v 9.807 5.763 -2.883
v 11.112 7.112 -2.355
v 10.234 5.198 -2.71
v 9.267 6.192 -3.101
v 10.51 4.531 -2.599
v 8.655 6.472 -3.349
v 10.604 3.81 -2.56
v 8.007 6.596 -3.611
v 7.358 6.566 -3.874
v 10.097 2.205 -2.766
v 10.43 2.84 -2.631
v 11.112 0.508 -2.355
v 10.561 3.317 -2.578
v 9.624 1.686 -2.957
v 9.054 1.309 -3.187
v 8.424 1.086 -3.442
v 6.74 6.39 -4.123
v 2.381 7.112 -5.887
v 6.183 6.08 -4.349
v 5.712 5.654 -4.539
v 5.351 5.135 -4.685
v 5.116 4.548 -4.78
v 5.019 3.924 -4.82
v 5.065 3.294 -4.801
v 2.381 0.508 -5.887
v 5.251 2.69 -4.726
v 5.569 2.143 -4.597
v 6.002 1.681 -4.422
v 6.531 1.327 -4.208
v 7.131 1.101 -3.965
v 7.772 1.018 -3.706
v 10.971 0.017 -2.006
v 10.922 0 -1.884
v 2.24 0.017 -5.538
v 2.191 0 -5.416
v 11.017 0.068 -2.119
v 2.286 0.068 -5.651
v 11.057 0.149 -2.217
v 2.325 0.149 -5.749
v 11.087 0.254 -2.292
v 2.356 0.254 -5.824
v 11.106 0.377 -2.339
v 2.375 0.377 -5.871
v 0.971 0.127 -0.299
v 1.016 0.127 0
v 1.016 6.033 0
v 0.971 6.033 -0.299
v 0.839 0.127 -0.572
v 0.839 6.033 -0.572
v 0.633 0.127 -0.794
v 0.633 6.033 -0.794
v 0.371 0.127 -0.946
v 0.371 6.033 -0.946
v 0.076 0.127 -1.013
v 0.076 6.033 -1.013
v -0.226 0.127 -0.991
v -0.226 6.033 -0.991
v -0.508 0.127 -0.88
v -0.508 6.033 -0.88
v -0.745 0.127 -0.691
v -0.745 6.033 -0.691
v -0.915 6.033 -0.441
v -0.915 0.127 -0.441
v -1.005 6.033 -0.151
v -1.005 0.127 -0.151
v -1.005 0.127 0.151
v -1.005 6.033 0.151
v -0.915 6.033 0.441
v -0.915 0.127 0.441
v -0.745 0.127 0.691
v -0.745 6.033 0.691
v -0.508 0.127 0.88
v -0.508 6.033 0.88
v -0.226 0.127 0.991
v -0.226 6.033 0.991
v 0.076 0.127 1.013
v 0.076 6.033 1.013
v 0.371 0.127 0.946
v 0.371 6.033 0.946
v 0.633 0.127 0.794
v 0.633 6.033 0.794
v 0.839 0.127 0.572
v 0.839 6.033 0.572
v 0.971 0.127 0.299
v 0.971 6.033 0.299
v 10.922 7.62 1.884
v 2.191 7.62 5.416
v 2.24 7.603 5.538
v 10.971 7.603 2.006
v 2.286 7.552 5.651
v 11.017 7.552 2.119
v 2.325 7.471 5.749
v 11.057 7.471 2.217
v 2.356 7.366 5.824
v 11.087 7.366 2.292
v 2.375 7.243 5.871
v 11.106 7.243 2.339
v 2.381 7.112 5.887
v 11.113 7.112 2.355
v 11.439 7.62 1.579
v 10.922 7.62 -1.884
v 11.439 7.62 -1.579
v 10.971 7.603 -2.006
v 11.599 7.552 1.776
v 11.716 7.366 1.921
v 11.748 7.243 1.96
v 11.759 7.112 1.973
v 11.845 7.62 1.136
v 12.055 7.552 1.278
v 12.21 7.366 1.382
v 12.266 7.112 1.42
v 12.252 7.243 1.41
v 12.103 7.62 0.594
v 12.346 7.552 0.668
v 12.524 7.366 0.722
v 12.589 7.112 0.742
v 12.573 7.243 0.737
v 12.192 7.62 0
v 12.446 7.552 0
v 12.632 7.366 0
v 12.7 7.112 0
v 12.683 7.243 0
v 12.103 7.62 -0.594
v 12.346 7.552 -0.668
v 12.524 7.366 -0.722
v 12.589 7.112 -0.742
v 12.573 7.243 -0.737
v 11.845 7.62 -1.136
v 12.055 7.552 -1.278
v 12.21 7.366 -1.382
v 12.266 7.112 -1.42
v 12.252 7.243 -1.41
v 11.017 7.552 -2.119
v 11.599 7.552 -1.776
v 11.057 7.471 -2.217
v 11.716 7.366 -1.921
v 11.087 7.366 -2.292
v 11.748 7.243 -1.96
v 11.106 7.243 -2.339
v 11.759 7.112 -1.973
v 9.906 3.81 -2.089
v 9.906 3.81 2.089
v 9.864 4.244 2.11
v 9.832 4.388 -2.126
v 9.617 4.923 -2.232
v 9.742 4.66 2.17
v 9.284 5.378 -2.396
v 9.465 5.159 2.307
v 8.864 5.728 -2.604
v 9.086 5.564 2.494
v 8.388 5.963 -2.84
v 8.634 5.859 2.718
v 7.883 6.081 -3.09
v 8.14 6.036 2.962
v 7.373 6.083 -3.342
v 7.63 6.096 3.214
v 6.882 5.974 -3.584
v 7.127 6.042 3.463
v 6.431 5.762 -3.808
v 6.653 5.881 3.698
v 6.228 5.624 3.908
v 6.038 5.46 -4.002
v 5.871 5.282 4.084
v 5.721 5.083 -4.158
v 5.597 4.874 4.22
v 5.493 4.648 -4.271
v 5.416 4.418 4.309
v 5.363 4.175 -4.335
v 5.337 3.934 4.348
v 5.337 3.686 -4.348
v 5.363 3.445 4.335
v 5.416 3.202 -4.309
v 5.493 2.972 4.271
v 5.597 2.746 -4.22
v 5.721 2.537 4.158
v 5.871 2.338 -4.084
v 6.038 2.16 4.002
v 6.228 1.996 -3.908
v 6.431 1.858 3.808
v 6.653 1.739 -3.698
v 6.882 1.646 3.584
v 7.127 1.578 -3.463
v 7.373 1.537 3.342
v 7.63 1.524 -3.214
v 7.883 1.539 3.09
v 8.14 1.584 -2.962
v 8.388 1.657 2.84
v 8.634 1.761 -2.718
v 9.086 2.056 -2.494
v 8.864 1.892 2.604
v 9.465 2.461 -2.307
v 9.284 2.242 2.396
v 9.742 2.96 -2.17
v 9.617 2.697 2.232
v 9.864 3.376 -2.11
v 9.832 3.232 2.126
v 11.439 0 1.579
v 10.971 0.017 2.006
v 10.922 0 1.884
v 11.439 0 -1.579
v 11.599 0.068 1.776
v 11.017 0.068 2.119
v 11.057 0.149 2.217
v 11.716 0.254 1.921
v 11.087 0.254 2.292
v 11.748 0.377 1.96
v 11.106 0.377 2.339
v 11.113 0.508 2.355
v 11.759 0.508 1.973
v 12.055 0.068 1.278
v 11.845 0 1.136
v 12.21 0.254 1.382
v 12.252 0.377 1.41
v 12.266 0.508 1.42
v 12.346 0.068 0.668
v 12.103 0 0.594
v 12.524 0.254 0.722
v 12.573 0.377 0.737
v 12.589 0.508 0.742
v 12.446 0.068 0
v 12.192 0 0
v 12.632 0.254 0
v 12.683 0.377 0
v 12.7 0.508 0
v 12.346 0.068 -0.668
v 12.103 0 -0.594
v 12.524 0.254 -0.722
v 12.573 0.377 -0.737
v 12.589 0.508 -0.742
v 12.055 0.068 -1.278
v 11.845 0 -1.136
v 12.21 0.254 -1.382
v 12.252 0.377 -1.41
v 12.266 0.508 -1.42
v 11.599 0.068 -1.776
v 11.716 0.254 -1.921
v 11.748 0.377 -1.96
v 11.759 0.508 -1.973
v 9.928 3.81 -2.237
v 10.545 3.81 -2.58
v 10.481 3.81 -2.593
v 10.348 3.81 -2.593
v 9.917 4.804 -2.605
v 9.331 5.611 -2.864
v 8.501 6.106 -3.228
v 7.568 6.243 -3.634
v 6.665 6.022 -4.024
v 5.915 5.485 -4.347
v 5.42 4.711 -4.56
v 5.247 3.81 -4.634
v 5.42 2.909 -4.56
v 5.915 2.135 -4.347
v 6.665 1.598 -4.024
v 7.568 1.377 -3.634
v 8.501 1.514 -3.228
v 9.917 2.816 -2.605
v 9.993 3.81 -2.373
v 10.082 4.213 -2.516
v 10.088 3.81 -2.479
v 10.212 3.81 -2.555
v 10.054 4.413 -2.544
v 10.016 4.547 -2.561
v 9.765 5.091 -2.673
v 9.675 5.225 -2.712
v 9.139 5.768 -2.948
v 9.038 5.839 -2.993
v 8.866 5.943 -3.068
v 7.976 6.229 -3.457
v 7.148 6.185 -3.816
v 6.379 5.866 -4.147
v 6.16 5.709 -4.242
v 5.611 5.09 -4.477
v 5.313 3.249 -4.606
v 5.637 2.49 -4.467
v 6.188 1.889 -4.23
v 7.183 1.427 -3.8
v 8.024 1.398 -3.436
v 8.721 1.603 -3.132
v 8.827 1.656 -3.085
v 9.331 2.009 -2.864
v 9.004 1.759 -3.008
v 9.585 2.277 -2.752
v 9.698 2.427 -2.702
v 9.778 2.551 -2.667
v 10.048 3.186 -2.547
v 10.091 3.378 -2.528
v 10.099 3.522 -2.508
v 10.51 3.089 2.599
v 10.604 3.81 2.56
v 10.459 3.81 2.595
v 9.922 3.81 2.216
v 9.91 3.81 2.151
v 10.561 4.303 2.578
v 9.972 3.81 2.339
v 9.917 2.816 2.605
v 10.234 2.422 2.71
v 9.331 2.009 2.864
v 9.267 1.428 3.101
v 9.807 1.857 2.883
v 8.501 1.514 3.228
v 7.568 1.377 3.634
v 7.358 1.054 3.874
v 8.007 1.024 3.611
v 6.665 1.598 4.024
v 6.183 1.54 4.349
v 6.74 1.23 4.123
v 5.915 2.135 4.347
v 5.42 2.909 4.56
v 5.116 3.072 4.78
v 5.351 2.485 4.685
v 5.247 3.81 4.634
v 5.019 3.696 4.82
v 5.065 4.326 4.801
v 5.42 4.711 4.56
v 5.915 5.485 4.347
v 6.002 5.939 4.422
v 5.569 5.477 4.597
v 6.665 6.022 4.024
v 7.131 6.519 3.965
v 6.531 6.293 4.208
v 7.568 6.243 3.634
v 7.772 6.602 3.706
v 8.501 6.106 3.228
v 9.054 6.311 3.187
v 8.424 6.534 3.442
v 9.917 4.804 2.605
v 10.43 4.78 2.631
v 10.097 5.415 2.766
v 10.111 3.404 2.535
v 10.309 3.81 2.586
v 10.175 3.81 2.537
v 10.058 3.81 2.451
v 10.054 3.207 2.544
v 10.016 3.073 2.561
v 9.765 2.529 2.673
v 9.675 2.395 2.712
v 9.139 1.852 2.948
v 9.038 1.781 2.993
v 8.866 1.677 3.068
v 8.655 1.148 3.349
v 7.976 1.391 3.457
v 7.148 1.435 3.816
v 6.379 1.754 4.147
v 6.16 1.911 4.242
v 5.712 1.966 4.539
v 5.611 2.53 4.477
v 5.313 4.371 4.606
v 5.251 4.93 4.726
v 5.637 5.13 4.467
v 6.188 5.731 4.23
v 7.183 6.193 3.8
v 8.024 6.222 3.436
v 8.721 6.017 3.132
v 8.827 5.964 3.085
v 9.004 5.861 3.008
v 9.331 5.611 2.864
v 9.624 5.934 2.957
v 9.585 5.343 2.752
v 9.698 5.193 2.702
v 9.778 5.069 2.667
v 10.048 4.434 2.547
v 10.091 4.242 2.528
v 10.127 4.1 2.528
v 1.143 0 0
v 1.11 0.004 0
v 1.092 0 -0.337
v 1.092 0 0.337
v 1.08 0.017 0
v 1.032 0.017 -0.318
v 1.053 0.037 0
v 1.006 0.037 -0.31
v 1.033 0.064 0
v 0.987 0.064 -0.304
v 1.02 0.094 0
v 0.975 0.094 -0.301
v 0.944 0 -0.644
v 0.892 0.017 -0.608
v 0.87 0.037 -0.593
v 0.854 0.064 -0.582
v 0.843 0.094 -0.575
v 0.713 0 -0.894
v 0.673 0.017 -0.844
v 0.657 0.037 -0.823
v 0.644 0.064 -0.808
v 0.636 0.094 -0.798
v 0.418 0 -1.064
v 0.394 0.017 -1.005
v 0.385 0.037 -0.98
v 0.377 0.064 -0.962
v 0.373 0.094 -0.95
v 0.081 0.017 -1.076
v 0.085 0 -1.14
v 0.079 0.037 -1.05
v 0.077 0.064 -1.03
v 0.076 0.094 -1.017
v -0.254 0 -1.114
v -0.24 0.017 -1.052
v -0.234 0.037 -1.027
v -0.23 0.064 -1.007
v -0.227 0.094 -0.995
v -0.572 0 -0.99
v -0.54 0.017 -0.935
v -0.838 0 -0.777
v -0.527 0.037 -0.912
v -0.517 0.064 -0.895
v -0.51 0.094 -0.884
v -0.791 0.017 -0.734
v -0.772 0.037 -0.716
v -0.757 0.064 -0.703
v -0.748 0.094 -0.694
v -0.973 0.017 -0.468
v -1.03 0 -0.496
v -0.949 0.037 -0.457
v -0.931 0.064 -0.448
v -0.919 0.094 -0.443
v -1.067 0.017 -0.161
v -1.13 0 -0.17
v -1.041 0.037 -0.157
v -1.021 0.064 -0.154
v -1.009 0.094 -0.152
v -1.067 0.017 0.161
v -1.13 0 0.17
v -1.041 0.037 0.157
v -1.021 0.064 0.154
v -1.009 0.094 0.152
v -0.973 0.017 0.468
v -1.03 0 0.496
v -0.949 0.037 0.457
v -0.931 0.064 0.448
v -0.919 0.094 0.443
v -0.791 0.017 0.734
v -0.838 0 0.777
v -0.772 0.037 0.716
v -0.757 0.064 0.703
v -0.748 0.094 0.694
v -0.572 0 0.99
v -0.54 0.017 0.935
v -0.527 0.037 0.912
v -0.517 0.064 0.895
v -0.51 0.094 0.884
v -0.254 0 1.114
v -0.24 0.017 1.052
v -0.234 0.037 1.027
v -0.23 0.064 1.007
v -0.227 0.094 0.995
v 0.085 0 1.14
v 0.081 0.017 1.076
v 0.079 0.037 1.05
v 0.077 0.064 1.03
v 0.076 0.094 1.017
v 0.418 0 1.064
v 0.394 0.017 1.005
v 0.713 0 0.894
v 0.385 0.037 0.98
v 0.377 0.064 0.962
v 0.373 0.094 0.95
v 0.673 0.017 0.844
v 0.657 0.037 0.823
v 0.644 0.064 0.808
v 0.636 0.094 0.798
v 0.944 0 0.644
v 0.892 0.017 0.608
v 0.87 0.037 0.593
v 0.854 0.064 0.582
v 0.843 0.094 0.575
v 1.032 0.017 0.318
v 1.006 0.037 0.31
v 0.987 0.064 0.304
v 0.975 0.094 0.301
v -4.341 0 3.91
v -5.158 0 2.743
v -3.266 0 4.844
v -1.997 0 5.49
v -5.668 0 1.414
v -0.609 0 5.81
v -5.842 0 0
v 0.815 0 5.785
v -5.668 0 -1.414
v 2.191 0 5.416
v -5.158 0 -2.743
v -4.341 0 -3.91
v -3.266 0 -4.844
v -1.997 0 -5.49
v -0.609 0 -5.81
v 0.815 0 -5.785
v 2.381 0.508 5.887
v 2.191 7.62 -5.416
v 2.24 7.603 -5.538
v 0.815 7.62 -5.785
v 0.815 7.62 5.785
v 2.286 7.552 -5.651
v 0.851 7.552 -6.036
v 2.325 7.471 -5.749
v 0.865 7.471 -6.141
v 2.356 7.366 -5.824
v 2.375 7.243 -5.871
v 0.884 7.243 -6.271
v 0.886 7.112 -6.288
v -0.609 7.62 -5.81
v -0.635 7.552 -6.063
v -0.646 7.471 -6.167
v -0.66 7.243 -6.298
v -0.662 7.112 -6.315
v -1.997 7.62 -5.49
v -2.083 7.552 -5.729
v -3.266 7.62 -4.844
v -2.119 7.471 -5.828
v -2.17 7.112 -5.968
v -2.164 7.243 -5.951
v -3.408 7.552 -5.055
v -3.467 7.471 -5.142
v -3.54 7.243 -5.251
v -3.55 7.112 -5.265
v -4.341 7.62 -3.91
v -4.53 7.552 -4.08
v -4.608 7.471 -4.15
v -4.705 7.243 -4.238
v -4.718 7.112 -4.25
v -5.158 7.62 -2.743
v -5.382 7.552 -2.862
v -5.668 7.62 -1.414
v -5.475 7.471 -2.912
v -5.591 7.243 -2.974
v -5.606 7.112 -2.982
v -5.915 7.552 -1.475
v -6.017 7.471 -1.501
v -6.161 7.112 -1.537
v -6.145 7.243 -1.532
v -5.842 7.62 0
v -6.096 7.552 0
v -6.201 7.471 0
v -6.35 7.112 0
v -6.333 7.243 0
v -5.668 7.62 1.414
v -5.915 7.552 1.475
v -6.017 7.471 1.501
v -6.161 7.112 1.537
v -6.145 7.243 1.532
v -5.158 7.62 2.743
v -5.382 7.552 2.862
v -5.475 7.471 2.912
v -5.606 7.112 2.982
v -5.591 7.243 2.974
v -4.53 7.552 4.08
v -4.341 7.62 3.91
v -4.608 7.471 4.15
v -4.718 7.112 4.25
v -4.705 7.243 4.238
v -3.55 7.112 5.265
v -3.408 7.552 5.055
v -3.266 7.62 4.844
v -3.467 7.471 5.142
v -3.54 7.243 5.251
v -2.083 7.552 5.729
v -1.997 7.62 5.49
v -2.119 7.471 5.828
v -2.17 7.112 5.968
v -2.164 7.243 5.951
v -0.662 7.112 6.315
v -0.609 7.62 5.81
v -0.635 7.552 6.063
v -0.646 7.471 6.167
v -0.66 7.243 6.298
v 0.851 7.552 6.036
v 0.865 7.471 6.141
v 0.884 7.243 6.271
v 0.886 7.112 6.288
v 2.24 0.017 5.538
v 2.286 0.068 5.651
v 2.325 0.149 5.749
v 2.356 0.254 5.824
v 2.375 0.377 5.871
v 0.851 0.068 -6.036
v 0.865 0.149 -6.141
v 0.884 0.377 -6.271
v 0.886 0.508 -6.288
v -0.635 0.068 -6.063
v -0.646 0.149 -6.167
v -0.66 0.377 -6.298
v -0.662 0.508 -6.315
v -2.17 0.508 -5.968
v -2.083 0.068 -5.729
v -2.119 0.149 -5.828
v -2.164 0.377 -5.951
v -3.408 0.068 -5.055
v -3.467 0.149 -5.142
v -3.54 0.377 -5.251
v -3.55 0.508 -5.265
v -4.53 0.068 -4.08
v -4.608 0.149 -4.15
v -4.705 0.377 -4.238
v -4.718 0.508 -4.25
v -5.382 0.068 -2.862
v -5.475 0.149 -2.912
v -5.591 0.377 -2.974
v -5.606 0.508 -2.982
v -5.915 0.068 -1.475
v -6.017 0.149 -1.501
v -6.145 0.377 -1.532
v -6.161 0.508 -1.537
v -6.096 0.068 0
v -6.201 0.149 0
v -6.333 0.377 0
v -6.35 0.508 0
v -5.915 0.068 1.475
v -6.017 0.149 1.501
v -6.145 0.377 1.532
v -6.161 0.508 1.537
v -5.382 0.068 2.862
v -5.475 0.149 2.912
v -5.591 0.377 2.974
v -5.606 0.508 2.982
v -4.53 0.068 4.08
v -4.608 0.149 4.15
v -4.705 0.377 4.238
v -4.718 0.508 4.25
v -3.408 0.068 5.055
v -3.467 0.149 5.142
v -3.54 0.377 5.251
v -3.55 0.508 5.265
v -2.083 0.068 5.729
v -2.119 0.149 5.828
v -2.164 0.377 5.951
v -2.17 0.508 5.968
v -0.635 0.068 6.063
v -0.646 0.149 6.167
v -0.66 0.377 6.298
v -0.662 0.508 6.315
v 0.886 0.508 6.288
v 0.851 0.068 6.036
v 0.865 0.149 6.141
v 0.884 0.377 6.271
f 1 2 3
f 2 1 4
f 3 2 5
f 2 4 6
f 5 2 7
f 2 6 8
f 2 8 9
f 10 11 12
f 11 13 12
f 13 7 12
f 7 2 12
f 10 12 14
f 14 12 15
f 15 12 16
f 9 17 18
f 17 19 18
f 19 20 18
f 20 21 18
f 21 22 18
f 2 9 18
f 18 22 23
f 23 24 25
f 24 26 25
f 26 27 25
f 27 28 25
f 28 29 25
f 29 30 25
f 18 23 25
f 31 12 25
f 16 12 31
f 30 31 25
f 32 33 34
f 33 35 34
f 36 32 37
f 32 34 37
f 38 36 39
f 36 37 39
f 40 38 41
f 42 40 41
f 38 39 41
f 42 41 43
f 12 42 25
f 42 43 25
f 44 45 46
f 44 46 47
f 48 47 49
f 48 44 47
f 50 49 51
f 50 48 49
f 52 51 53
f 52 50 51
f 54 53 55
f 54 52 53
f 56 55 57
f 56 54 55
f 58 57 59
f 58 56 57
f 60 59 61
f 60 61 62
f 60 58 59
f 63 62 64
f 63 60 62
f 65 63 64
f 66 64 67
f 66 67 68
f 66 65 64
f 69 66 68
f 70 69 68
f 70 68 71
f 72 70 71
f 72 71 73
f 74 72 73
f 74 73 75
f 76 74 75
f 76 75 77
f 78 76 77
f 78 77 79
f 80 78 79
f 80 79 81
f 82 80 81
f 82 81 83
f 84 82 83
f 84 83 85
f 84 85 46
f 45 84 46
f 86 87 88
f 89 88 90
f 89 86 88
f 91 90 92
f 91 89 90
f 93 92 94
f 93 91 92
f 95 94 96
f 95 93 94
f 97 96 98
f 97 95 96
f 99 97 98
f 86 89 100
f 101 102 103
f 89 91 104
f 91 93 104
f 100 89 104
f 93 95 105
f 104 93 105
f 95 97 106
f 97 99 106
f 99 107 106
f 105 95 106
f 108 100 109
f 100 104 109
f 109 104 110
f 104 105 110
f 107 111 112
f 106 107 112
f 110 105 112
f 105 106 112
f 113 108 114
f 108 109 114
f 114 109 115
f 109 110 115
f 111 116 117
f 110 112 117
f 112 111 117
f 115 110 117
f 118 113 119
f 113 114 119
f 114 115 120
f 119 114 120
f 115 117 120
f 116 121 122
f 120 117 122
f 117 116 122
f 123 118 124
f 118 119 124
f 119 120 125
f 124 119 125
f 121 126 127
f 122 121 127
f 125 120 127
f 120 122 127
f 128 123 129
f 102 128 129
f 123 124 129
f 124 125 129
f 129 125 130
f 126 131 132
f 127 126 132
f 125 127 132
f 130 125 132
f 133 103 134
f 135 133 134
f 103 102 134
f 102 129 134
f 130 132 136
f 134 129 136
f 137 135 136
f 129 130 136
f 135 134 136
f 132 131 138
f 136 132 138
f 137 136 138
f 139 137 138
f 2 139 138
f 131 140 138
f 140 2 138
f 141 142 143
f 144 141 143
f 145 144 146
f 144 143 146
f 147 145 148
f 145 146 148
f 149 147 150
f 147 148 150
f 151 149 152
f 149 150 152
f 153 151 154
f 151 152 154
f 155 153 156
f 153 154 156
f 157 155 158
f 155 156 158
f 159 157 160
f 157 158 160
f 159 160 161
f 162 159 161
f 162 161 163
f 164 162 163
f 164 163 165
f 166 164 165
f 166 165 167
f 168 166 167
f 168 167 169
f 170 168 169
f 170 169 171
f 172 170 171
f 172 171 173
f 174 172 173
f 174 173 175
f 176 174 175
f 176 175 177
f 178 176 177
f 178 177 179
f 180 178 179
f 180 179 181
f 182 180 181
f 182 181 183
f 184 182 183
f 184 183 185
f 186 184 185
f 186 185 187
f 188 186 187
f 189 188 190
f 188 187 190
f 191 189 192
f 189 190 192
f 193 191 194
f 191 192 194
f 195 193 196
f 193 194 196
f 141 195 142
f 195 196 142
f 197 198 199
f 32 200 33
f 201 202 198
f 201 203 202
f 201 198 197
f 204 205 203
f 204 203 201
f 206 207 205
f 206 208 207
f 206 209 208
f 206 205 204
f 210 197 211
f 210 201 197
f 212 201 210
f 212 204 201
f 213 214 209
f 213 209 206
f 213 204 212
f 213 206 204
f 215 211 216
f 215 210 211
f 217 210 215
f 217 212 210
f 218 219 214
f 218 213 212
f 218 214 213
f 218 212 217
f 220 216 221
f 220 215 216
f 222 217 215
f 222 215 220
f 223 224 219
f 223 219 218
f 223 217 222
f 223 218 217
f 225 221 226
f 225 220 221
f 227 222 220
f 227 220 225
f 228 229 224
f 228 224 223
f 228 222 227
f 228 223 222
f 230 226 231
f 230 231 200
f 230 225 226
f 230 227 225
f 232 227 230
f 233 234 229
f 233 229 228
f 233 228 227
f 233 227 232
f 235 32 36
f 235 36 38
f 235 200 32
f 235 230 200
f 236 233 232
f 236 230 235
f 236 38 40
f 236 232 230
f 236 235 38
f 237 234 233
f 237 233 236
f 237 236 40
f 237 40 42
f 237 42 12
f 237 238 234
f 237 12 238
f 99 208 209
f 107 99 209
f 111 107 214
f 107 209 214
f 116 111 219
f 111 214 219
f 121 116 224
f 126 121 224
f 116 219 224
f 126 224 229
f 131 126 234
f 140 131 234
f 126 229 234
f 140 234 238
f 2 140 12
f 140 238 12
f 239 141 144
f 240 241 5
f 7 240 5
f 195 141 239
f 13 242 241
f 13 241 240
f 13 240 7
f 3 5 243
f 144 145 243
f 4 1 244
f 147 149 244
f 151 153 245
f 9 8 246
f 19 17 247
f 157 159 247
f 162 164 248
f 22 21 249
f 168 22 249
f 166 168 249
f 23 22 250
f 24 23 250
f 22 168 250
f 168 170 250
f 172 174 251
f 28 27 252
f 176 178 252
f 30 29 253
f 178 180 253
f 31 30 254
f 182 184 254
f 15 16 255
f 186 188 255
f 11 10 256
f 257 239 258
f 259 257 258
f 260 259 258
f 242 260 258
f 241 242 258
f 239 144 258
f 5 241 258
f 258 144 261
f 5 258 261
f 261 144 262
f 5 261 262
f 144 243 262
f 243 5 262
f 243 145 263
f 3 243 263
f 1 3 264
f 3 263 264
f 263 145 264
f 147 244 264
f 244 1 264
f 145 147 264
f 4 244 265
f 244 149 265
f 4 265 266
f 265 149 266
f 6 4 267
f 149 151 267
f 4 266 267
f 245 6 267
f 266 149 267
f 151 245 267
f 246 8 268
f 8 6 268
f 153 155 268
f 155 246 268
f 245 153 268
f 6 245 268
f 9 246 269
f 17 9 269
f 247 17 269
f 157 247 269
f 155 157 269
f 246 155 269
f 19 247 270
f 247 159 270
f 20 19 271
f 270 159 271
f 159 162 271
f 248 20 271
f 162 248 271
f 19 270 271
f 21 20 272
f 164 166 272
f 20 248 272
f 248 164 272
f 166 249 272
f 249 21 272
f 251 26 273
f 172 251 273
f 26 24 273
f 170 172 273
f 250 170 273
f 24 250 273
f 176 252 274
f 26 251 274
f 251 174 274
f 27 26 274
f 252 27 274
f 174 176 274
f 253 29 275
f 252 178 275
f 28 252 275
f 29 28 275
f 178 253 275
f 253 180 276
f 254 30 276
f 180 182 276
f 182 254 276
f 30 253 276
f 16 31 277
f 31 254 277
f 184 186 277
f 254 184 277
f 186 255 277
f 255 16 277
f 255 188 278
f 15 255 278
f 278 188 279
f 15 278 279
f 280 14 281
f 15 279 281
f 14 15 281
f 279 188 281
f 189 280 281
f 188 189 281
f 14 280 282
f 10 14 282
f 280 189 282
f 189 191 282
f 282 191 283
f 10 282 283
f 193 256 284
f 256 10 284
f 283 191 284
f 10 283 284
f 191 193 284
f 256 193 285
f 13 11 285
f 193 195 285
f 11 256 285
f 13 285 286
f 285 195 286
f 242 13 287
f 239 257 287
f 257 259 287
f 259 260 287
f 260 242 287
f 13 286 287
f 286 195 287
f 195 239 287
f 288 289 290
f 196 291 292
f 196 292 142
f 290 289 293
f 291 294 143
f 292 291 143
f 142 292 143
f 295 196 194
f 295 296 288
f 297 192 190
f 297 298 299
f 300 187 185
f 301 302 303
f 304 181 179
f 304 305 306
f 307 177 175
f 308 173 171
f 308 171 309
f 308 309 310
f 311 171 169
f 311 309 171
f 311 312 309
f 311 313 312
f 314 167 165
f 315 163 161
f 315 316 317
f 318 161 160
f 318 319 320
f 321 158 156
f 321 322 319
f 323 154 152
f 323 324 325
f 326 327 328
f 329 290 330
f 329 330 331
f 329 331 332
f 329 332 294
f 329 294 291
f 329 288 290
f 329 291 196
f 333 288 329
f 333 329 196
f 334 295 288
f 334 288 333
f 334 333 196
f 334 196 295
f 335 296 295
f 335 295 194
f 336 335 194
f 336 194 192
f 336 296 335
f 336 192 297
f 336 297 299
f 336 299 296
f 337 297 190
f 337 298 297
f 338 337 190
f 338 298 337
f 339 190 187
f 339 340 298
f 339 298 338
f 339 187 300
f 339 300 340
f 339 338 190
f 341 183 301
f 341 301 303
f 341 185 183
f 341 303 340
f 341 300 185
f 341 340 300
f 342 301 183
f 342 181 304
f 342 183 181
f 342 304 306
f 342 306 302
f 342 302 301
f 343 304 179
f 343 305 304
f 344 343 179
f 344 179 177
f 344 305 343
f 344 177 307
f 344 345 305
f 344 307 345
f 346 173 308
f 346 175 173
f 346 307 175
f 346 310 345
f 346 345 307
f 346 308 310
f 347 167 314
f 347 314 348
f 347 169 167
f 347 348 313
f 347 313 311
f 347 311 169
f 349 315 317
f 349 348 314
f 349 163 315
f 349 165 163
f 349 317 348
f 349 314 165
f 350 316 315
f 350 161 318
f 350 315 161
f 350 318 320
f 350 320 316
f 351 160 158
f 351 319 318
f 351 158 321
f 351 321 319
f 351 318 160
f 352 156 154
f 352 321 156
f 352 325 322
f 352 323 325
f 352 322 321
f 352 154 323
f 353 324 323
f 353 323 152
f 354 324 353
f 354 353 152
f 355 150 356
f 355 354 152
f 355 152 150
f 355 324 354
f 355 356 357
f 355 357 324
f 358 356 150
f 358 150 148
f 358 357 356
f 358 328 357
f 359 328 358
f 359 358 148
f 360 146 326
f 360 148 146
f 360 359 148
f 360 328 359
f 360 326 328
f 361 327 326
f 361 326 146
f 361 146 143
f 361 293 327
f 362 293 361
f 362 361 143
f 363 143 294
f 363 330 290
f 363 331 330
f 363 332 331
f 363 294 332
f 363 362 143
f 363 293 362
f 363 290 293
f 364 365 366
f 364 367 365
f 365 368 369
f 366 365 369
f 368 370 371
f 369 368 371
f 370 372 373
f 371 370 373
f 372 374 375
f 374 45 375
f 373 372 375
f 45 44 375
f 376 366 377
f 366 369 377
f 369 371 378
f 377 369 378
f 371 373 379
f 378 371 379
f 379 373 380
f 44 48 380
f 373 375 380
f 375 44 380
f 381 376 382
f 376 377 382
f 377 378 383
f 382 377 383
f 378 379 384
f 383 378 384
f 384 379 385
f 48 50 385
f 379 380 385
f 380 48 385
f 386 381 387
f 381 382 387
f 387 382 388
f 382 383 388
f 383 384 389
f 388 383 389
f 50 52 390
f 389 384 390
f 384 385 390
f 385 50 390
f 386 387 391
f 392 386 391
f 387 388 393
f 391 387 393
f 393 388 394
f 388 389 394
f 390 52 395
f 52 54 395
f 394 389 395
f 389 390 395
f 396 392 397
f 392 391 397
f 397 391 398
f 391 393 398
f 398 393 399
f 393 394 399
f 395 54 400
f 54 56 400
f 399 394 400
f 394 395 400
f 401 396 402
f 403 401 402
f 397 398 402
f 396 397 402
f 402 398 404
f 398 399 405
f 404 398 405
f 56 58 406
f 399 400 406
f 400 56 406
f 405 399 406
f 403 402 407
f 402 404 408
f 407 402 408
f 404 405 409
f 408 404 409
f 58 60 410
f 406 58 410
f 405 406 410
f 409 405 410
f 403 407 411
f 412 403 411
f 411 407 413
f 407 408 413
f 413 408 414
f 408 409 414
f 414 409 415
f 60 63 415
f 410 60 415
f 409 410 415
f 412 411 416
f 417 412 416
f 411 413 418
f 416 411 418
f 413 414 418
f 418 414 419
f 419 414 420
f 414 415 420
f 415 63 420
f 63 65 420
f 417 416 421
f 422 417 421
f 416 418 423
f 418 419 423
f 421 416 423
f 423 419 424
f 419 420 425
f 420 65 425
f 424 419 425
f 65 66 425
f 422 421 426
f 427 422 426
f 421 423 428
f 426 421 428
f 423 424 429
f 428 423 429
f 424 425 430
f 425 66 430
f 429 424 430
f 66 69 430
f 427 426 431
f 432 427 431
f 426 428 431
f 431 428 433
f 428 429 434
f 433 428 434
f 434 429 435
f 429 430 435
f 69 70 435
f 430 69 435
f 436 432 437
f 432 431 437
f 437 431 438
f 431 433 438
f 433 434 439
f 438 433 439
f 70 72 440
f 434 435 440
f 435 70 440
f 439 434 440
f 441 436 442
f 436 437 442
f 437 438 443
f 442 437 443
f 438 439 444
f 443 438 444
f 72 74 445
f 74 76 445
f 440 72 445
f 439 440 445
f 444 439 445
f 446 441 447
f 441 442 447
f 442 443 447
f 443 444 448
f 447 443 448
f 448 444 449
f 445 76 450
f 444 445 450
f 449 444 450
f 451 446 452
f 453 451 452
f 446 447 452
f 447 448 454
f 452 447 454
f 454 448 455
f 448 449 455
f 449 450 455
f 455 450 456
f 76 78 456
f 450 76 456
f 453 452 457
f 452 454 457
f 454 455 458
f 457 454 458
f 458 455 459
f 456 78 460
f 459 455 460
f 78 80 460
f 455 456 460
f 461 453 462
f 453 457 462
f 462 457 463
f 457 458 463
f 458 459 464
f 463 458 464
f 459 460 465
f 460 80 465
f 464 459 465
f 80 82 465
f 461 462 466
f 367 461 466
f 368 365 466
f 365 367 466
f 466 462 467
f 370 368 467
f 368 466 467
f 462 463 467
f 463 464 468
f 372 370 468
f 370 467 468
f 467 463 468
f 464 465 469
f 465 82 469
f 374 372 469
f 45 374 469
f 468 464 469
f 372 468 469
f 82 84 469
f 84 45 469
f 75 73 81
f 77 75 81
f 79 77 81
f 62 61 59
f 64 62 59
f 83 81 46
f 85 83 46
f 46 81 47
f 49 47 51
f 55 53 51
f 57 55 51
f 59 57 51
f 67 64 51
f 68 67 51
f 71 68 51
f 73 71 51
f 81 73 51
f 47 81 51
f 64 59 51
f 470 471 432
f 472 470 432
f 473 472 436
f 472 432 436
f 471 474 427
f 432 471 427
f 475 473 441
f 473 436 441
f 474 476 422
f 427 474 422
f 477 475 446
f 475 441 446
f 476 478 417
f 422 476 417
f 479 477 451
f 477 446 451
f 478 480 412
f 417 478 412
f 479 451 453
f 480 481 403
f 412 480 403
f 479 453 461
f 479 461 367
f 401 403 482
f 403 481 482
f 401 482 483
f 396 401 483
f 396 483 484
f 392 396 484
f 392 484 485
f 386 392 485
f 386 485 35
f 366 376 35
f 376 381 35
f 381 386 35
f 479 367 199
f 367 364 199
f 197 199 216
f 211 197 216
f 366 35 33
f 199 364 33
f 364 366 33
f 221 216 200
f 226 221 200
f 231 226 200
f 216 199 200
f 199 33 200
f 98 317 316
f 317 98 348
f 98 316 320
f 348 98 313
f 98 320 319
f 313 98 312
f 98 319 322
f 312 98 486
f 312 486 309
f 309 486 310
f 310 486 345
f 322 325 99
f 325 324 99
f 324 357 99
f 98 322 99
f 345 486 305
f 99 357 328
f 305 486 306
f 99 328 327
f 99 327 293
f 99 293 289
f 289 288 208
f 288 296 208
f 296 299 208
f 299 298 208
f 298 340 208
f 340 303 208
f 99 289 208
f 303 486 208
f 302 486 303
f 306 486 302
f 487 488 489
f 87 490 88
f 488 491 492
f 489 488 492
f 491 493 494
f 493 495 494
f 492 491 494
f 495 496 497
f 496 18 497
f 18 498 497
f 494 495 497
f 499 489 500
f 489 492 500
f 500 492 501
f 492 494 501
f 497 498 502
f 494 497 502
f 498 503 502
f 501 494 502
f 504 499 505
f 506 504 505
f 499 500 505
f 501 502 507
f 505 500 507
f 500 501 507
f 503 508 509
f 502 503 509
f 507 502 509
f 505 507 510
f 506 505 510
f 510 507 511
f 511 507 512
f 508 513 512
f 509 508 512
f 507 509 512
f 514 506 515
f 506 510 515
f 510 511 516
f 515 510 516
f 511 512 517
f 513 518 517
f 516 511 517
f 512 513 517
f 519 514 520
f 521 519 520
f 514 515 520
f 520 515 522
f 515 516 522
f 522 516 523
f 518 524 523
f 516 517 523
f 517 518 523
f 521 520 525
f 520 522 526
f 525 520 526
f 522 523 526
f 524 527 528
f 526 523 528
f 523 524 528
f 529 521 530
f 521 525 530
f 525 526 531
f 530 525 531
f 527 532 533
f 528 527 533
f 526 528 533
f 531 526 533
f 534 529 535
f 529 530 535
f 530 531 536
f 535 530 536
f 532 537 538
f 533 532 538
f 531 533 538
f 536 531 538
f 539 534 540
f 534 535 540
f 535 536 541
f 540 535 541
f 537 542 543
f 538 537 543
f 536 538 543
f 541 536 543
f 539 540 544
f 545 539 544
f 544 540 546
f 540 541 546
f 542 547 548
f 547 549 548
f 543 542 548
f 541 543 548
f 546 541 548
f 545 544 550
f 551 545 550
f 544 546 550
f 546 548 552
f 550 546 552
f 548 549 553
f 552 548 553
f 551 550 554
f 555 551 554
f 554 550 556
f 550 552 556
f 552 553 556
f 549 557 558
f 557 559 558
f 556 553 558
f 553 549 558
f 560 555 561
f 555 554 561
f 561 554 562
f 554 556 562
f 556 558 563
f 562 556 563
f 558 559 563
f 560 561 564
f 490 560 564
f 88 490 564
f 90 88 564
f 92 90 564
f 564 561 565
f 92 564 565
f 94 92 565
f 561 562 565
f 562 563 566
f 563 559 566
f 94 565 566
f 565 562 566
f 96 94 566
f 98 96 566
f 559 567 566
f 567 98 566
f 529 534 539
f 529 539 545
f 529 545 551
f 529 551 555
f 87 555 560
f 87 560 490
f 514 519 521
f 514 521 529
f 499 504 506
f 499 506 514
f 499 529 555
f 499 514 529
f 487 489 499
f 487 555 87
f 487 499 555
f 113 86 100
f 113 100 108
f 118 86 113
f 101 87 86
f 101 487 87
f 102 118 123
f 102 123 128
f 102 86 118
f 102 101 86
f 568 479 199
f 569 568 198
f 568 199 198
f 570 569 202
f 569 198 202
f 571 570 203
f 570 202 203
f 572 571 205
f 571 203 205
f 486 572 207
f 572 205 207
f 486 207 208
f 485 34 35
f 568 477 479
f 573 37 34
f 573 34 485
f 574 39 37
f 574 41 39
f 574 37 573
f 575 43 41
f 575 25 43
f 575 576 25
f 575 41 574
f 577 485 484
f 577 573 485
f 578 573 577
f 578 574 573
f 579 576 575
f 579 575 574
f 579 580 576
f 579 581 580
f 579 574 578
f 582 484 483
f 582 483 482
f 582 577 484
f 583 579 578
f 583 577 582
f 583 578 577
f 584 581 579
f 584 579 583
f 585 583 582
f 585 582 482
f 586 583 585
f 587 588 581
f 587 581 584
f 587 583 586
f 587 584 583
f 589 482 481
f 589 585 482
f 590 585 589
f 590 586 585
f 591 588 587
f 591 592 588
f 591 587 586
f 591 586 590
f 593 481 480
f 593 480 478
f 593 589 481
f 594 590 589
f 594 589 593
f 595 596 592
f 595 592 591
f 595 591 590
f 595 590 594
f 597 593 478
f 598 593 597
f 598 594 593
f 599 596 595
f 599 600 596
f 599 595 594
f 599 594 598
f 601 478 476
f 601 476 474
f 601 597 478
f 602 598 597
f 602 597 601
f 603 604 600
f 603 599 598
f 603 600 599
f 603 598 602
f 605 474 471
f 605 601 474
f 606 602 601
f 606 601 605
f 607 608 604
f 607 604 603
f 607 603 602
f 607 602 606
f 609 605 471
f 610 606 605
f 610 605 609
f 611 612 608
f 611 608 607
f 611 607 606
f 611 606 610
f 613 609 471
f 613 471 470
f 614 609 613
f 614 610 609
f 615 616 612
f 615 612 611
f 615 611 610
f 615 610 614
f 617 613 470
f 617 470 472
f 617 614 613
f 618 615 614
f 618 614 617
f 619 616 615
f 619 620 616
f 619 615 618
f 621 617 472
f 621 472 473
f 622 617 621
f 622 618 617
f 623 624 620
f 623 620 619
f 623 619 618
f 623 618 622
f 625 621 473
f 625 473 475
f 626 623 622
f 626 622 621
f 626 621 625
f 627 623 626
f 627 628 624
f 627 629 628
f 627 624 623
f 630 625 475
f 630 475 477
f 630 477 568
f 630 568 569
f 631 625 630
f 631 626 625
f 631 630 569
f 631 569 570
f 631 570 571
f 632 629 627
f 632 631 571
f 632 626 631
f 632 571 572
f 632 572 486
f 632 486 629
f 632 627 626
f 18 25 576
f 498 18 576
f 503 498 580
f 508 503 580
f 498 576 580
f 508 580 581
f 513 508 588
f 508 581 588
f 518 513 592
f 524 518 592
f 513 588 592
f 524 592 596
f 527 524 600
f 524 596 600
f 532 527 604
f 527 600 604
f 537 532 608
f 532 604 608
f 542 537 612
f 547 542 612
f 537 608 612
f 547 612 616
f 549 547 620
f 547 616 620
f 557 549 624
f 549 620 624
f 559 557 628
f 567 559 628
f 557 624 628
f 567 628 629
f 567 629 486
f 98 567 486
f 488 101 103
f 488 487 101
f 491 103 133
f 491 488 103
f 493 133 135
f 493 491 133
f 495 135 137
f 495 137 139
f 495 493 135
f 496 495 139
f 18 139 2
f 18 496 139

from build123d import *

# Parameters (mm, degrees)
SKETCH1_R               = 1.016
BOSS_EXTRUDE1_DEPTH     = 7.62
SKETCH2_R               = 1.016
BOSS_EXTRUDE2_DEPTH     = 1.5875
SKETCH3_R               = 2.286
CUT_EXTRUDE1_DEPTH      = 7.35
CUT_EXTRUDE1_DEPTH_BACK = 7.35
FILLET1_R               = 0.508
FILLET2_R               = 0.127


with BuildPart() as part:
    # Sketch1 → Boss-Extrude1 (new body)
    with BuildSketch(Plane(origin=(0, 0, 0), x_dir=(1, 0, 0), z_dir=(0, 1, 0))):
        with BuildLine():
            Line((11.1125, 2.35464302), (2.38125, 5.886607549))
            ThreePointArc((2.38125, 5.886607549), (-6.35, 0), (2.38125, -5.886607549))
            Line((2.38125, -5.886607549), (11.1125, -2.35464302))
            ThreePointArc((11.1125, -2.35464302), (12.7, 0), (11.1125, 2.35464302))
        make_face()
        Circle(SKETCH1_R, mode=Mode.SUBTRACT)
    extrude(amount=BOSS_EXTRUDE1_DEPTH)

    # Sketch2 → Boss-Extrude2 (add)
    with BuildSketch(Plane(origin=(0, 7.62, 0), x_dir=(1, 0, 0), z_dir=(0, 1, 0))):
        Circle(SKETCH2_R)
    extrude(amount=-BOSS_EXTRUDE2_DEPTH)

    # Sketch3 → Cut-Extrude1 (cut, two sides)
    with BuildSketch(Plane.XY) as cut_extrude1_sk:
        with Locations((7.62, 3.81)):
            Circle(SKETCH3_R)
    extrude(amount=CUT_EXTRUDE1_DEPTH, mode=Mode.SUBTRACT)
    extrude(cut_extrude1_sk.sketch, amount=-CUT_EXTRUDE1_DEPTH_BACK, mode=Mode.SUBTRACT)

    # Fillet1
    fillet1_edges = [part.edges().sort_by_distance(p)[0] for p in [
        (6.746875, 0, -4.120625284),
        (6.746875, 7.62, -4.120625284),
        (5.334, 3.809986249, -4.692161363),
        (5.334, 3.810013751, 4.692161363),
        (6.746875, 0, 4.120625284),
        (6.746875, 7.62, 4.120625284),
        (-6.35, 0, 0),
        (-6.35, 7.62, 0),
        (12.7, 7.62, 0),
        (12.7, 0, 0),
    ]]
    fillet(fillet1_edges, radius=FILLET1_R)

    # Fillet2
    fillet2_edges = [part.edges().sort_by_distance(p)[0] for p in [
        (-1.016, 0, 0),
    ]]
    fillet(fillet2_edges, radius=FILLET2_R)


solid = part.part
